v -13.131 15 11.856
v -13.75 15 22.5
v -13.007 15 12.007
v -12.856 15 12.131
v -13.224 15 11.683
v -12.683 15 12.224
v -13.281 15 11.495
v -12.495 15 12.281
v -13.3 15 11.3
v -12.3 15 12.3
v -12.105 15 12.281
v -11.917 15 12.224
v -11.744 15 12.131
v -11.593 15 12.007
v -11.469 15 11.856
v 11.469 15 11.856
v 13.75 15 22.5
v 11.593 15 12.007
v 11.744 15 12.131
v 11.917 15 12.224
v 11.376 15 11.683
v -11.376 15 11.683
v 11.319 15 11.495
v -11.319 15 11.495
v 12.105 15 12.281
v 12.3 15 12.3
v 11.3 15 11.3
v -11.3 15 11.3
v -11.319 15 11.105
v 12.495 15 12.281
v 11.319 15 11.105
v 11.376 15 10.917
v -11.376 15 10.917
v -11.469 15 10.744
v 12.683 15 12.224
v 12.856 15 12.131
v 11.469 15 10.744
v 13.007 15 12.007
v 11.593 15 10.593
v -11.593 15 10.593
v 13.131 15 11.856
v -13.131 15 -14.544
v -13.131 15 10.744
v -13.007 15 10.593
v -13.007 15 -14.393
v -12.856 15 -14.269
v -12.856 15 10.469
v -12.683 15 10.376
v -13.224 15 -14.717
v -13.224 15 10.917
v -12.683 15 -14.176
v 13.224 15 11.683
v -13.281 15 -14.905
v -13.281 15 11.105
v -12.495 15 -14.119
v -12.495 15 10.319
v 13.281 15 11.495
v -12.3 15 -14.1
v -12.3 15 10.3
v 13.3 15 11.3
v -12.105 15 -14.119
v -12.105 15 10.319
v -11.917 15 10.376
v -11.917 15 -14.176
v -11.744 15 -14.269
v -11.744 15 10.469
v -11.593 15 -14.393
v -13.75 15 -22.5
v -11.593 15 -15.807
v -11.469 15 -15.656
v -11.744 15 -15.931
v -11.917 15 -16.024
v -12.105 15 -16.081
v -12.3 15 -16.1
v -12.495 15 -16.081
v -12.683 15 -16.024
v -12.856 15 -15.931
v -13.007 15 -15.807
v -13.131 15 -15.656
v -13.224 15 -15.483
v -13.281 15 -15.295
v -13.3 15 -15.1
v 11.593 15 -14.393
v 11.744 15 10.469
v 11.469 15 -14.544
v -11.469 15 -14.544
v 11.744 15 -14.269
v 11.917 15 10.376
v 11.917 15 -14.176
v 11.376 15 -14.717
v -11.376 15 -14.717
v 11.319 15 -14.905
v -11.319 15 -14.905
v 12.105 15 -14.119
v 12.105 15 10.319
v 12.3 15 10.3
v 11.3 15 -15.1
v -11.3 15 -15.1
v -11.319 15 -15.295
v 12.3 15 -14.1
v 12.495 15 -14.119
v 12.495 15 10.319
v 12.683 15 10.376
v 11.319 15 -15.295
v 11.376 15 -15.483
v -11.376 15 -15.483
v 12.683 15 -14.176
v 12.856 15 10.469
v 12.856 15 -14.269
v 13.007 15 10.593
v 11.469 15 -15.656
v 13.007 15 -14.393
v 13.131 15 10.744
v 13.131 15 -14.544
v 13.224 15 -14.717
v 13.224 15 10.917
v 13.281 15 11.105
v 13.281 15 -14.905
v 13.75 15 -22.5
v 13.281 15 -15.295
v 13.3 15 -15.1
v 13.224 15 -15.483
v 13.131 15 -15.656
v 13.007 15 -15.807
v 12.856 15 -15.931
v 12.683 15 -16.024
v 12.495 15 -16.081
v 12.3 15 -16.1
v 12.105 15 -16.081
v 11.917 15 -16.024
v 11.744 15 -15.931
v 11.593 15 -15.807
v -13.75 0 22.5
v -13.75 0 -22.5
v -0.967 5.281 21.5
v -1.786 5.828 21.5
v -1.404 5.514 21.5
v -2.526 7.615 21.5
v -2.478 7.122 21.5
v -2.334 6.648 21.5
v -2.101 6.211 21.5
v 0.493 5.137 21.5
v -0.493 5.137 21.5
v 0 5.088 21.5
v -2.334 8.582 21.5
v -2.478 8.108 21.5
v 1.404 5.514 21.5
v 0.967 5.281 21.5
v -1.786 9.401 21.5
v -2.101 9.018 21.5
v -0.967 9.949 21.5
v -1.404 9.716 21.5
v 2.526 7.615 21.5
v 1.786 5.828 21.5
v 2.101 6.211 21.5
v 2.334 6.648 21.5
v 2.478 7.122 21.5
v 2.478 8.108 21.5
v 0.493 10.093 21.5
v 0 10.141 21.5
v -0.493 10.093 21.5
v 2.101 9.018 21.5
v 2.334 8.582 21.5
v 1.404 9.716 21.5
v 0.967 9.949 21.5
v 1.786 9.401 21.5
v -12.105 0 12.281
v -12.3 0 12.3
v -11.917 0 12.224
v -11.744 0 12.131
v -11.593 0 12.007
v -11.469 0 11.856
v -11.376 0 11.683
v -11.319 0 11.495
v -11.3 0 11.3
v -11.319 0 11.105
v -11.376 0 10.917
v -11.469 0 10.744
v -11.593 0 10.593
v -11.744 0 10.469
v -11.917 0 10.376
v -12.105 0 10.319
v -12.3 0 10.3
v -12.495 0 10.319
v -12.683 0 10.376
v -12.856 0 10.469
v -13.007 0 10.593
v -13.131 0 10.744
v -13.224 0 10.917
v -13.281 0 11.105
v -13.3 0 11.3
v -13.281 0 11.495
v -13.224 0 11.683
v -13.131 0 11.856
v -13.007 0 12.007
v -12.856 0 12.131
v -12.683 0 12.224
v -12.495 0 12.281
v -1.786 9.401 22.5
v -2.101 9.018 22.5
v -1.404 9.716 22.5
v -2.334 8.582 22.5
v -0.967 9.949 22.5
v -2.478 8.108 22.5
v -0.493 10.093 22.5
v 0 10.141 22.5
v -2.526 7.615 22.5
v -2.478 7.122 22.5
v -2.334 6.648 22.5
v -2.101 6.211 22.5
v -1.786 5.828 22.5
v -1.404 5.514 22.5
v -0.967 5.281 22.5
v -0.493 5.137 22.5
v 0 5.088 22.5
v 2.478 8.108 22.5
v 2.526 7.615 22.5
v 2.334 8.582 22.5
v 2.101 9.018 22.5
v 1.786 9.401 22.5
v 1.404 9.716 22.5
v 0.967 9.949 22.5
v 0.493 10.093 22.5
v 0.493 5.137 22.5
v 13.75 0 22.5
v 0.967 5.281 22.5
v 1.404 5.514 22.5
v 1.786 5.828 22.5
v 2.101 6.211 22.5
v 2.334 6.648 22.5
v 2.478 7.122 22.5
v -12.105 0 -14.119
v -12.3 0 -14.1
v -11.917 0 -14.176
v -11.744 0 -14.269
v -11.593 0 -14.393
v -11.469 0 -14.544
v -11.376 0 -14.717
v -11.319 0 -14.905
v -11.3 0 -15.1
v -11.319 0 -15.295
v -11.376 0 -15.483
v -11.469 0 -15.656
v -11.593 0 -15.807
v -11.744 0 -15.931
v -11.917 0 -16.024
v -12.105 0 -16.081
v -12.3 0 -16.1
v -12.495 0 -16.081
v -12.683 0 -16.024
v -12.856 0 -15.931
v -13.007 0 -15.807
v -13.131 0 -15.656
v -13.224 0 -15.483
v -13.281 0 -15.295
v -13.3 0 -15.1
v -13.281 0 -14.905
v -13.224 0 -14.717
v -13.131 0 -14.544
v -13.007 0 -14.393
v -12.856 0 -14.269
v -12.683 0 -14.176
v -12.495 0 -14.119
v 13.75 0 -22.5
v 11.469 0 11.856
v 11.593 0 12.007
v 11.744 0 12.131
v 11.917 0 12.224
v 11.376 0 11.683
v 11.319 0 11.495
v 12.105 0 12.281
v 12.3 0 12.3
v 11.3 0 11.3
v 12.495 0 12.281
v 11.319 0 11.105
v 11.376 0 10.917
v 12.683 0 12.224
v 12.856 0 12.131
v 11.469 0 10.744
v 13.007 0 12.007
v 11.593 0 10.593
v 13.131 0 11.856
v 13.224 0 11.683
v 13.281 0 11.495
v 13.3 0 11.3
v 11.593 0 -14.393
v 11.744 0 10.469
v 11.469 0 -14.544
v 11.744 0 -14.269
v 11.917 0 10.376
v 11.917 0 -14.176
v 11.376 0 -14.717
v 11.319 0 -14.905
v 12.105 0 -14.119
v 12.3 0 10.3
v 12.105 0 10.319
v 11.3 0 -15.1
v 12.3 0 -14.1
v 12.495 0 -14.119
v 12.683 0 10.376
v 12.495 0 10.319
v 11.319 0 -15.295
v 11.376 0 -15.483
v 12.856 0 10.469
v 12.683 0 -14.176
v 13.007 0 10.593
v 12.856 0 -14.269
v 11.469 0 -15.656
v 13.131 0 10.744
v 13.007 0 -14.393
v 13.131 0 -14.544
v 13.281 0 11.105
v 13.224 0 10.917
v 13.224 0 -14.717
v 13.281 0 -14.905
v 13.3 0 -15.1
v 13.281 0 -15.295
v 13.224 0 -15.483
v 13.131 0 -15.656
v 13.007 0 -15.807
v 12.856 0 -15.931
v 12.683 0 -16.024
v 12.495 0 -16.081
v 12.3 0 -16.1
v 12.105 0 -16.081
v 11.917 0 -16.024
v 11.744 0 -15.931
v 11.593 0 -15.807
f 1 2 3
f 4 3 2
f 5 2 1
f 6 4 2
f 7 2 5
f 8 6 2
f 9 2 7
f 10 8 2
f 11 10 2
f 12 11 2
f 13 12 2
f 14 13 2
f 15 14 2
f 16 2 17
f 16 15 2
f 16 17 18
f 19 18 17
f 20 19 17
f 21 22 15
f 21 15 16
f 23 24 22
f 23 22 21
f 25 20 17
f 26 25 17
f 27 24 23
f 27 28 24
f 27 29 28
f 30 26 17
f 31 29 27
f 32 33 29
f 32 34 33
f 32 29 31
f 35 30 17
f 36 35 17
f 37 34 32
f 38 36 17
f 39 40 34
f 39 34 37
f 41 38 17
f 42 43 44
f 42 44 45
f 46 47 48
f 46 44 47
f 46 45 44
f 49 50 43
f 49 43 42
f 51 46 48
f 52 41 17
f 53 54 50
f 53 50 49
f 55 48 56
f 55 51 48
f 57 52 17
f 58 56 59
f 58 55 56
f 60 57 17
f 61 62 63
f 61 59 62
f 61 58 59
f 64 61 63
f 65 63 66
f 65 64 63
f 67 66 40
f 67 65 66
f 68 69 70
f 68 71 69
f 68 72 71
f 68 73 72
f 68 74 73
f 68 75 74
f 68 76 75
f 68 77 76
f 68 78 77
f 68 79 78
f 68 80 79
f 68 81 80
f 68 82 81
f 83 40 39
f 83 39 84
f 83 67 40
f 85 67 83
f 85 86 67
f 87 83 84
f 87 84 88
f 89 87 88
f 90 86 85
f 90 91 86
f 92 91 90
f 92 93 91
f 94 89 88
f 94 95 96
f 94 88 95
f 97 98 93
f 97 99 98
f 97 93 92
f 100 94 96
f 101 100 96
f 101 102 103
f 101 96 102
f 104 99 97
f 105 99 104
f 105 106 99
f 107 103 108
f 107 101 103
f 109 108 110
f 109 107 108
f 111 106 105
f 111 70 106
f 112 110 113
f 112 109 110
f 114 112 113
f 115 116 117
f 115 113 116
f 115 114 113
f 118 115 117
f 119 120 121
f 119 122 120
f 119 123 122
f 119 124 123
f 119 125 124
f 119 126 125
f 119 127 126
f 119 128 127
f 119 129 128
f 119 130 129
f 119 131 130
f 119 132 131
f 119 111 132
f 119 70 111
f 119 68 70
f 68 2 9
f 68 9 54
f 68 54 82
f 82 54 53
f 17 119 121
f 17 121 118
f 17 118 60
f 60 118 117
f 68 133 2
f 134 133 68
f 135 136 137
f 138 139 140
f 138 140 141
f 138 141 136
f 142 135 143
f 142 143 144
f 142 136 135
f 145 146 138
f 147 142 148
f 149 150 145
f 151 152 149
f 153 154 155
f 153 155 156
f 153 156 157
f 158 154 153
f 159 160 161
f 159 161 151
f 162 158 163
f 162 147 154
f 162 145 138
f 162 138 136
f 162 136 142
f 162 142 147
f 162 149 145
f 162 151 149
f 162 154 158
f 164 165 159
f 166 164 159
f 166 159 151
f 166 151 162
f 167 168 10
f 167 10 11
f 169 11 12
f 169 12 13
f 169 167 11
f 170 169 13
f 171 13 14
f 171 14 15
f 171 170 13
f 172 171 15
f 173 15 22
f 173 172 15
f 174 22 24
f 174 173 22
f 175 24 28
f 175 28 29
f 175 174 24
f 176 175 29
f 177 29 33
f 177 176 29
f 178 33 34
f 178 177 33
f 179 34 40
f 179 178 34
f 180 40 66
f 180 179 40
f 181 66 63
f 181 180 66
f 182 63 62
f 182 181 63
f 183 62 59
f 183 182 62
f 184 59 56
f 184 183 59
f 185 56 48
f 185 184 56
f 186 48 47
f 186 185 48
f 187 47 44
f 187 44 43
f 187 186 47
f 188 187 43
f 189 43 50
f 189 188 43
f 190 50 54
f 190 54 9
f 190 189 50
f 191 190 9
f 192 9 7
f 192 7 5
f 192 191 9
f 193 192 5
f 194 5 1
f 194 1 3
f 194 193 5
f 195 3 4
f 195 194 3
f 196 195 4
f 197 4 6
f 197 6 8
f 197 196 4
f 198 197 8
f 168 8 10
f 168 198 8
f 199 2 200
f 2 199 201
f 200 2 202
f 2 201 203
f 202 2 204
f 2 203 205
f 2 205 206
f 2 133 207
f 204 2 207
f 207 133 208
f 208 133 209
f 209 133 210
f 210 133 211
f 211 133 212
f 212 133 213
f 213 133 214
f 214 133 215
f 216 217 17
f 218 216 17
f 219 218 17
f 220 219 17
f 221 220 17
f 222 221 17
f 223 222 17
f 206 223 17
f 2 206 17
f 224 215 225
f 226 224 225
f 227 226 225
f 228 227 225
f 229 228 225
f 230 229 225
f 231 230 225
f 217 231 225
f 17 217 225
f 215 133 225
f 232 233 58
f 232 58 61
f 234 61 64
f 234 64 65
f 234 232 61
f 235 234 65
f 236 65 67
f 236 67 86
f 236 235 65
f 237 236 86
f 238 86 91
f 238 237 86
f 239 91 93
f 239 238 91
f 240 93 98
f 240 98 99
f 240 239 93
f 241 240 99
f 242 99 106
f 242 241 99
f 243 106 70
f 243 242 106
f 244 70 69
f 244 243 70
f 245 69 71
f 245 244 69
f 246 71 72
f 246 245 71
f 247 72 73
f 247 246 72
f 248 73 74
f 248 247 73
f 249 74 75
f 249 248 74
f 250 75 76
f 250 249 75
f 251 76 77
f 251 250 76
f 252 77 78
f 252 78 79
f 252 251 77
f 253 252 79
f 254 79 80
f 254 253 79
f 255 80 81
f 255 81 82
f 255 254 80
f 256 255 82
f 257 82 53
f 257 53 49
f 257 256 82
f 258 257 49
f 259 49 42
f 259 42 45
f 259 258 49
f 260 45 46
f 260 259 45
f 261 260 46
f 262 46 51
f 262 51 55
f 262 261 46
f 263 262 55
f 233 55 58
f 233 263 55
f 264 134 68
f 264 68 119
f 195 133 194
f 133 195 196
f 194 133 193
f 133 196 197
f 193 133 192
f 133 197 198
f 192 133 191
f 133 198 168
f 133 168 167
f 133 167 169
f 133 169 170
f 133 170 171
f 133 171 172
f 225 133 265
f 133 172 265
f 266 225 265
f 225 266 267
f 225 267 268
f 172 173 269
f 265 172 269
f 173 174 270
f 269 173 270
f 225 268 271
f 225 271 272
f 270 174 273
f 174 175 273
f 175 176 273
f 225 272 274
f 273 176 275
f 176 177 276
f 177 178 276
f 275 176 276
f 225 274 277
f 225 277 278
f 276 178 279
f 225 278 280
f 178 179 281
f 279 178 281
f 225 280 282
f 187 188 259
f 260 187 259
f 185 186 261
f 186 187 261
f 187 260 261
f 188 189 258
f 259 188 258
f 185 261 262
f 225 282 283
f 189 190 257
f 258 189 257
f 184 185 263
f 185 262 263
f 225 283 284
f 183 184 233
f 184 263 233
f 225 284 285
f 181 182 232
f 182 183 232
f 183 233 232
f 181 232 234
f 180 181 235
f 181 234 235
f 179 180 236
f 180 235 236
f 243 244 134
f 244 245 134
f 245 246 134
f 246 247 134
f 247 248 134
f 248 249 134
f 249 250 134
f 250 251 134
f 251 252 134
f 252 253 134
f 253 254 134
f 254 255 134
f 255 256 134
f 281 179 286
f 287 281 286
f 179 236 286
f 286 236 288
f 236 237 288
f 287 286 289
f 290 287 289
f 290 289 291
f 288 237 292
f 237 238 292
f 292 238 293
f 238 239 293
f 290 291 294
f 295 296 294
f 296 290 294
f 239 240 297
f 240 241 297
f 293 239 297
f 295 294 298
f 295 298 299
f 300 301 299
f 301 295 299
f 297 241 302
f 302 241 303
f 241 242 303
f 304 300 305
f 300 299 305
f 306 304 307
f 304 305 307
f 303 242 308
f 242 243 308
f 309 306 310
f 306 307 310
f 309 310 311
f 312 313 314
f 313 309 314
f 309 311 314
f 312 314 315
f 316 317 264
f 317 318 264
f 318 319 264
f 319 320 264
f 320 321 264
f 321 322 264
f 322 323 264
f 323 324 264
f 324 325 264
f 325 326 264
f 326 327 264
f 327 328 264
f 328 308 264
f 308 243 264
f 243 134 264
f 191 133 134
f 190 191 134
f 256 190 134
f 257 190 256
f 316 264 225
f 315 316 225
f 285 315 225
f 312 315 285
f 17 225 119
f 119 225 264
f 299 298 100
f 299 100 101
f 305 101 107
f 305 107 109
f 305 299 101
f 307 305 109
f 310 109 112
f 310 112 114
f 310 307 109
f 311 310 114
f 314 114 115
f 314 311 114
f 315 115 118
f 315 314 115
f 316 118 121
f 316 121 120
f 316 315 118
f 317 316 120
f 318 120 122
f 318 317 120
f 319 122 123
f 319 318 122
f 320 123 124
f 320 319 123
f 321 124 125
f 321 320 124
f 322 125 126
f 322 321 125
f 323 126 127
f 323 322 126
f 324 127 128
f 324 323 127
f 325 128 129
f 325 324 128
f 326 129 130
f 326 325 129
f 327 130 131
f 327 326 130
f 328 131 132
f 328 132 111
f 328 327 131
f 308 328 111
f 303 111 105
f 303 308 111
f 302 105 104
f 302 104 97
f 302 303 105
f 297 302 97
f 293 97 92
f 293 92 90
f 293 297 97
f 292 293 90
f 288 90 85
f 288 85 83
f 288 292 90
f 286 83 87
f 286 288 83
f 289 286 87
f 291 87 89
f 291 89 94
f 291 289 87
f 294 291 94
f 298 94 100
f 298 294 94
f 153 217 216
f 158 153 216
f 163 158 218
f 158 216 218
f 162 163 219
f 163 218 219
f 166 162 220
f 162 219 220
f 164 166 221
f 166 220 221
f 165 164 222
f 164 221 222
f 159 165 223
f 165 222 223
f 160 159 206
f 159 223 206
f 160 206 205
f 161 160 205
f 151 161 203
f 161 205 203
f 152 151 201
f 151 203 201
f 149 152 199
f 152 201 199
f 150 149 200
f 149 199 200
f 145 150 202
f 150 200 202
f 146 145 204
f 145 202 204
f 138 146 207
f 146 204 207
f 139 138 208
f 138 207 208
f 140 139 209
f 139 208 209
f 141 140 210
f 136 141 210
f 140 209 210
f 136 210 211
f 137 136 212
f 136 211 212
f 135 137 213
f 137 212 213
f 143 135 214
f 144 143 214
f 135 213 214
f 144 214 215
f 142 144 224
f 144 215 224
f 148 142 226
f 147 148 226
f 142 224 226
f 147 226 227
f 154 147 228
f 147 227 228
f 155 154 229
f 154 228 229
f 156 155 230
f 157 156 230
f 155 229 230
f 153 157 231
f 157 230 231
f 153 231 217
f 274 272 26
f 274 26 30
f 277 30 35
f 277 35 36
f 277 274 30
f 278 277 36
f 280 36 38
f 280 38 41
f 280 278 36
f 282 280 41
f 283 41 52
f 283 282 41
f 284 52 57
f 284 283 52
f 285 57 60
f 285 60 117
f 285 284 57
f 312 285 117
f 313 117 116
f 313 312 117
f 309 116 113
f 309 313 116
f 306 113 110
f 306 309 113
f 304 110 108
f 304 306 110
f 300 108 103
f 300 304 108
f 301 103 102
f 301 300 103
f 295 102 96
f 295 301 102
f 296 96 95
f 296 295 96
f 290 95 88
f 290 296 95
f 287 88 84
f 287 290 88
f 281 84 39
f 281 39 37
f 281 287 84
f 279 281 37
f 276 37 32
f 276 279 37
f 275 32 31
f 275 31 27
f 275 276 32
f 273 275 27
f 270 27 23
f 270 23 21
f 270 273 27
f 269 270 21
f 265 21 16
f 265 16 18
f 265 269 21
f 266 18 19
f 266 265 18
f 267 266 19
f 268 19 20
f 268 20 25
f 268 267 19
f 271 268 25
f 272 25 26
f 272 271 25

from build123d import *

# Parameters (mm, degrees)
SKETCH_1_W          = 27.5
SKETCH_1_H          = 45
SKETCH_1_R          = 1
EXTRUDE_1_DEPTH     = 15
SKETCH_2_R          = 2.526456565
CUT_EXTRUDE_1_DEPTH = 1


with BuildPart() as part:
    # 草图1 → 凸台-拉伸1 (new body)
    with BuildSketch(Plane(origin=(0, 0, 0), x_dir=(1, 0, 0), z_dir=(0, 1, 0))):
        Rectangle(SKETCH_1_W, SKETCH_1_H)
        with Locations(Location((-12.3, 15.1, 0), (0, 0, 270))):
            Circle(SKETCH_1_R, mode=Mode.SUBTRACT)
        with Locations(Location((12.3, 15.1, 0), (0, 0, 270))):
            Circle(SKETCH_1_R, mode=Mode.SUBTRACT)
        with Locations(Location((12.3, -11.3, 0), (0, 0, 270))):
            Circle(SKETCH_1_R, mode=Mode.SUBTRACT)
        with Locations(Location((-12.3, -11.3, 0), (0, 0, 270))):
            Circle(SKETCH_1_R, mode=Mode.SUBTRACT)
    extrude(amount=EXTRUDE_1_DEPTH)

    # 草图2 → 切除-拉伸1 (cut)
    with BuildSketch(Plane.XY.offset(22.5)):
        with Locations((0, 7.614868715)):
            Circle(SKETCH_2_R)
    extrude(amount=-CUT_EXTRUDE_1_DEPTH, mode=Mode.SUBTRACT)


solid = part.part
